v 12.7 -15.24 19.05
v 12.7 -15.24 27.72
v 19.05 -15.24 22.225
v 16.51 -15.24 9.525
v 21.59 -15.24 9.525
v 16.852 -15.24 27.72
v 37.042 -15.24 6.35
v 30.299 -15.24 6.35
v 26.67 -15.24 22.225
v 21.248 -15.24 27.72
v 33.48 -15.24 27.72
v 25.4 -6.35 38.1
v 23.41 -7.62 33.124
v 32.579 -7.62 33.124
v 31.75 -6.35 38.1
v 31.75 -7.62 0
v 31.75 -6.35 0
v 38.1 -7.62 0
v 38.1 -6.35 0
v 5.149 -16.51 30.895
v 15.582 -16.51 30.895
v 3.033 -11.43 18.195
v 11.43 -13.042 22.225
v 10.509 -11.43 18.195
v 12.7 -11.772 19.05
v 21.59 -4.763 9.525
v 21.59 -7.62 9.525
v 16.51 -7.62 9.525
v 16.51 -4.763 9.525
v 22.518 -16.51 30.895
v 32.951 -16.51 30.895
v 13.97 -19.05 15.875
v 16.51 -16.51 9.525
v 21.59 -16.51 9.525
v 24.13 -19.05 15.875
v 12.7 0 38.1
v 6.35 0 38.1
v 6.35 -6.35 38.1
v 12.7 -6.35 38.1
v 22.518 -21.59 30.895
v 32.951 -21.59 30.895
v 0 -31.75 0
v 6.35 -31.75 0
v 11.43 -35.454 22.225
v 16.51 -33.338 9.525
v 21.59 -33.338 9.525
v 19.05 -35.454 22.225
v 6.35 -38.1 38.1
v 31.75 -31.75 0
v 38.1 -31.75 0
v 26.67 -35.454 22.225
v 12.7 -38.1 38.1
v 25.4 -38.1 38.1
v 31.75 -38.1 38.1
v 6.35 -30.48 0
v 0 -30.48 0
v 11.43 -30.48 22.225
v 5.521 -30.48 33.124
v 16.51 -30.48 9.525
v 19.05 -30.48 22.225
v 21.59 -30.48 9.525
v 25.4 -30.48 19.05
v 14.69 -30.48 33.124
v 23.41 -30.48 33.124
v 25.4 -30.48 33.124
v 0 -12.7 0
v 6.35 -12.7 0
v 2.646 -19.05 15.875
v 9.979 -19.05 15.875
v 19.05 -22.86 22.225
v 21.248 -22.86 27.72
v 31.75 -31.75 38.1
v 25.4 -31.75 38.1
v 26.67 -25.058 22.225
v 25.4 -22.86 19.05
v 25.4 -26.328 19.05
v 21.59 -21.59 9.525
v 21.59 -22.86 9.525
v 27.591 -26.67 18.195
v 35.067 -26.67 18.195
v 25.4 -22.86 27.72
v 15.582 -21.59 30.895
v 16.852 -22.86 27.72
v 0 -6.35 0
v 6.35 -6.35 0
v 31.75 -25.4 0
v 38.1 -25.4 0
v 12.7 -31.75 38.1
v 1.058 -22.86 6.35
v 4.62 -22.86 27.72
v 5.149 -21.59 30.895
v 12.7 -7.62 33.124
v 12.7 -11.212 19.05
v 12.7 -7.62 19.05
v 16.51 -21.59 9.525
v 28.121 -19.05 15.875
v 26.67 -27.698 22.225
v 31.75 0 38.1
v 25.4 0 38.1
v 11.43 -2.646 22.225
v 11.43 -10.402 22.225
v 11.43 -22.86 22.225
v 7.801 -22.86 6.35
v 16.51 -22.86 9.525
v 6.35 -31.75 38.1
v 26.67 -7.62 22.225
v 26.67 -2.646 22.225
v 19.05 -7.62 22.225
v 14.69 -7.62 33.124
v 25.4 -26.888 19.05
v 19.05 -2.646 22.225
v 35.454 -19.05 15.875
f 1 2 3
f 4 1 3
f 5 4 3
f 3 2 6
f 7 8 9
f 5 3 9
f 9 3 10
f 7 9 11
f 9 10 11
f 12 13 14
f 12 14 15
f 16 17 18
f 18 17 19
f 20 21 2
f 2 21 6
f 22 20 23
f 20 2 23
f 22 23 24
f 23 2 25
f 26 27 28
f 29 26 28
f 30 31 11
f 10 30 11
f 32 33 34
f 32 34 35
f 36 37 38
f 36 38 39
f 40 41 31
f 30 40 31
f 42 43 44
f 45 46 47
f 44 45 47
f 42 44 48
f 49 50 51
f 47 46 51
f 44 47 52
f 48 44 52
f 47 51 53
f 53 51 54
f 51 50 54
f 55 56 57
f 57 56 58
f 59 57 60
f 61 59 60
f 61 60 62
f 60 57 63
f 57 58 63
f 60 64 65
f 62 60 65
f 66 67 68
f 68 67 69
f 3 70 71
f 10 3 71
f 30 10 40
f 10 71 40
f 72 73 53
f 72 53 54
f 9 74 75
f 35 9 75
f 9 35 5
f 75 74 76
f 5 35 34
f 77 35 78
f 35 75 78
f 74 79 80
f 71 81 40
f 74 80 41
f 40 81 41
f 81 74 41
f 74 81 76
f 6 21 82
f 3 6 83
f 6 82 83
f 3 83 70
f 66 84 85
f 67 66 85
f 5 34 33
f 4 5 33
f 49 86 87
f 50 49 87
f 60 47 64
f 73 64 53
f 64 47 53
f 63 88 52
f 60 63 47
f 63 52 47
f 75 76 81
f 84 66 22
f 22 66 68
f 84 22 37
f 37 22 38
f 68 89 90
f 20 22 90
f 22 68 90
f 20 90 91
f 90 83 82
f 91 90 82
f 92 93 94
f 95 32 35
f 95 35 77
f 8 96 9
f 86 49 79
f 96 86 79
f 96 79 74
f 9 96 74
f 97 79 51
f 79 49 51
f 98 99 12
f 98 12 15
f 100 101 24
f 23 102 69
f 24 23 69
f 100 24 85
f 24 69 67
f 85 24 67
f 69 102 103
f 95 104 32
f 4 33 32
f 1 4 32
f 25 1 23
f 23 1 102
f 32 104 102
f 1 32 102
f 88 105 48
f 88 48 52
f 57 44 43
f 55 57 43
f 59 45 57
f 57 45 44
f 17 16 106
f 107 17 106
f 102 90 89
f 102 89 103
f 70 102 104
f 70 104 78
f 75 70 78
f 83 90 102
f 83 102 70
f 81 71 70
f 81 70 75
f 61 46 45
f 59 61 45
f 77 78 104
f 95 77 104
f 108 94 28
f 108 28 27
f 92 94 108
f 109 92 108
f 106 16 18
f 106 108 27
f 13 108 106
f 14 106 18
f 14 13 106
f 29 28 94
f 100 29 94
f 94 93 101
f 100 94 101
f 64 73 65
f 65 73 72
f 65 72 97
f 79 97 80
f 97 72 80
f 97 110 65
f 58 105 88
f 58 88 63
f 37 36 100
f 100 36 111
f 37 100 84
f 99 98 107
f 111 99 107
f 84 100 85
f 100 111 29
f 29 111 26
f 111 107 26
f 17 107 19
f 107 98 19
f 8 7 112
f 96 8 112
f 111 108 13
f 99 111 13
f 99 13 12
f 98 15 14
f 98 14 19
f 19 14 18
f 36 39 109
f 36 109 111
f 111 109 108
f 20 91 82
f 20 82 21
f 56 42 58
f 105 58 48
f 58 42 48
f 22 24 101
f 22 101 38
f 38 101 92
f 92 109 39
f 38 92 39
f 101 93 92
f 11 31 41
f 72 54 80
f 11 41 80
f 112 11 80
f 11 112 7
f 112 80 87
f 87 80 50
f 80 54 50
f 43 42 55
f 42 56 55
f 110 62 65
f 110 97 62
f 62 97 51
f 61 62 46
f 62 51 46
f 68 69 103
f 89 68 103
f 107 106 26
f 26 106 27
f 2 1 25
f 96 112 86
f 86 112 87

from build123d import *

# Parameters (mm, degrees)
F0_W      = 38.1
F0_H      = 38.099996
F1_DEPTH  = 38.1
F6_DEPTH  = 38.1
F8_DEPTH  = 38.1
F9_W      = 25.4
F9_H      = 7.62
F10_DEPTH = 38.1


with BuildPart() as f1:
    # F0 (on Front) → F1 (new body)
    with BuildSketch(Plane.XZ):
        with Locations((19.05, 19.049998)):
            Rectangle(F0_W, F0_H)
    extrude(amount=F1_DEPTH)

    # F5 (on offset) → F6 (cut)
    with BuildSketch(Plane.YZ.offset(38.1)):
        Polygon((-31.75, 0), (-38.1, 38.1), (-38.1, 0), align=None)
        Polygon((-11.43, 18.195421), (-6.35, 38.1), (-31.75, 38.1), (-26.67, 18.195421), (-21.59, 30.895421), (-16.51, 30.895421), align=None)
        Polygon((-25.4, 0), (-12.7, 0), (-19.05, 15.875), align=None)
        Polygon((-6.35, 0), (0, 0), (0, 38.1), align=None)
    extrude(amount=-F6_DEPTH, mode=Mode.SUBTRACT)

    # F7 (on offset) → F8 (cut)
    with BuildSketch(Plane.XZ.offset(38.1)):
        Polygon((0, 38.1), (0, 0), (6.35, 38.1), align=None)
        Polygon((25.4, 38.1), (12.7, 38.1), (19.05, 22.225), align=None)
        Polygon((31.75, 38.1), (38.1, 0), (38.1, 38.1), align=None)
        Polygon((11.43, 22.225), (6.35, 0), (31.75, 0), (26.67, 22.225), (21.59, 9.525), (16.51, 9.525), align=None)
    extrude(amount=-F8_DEPTH, mode=Mode.SUBTRACT)

    # F9 (on offset) → F10 (cut)
    with BuildSketch(Plane.XY.offset(38.1)):
        with Locations((12.7, -26.67)):
            Rectangle(F9_W, F9_H)
        with Locations((25.4, -11.43)):
            Rectangle(F9_W, F9_H)
    extrude(amount=-F10_DEPTH, mode=Mode.SUBTRACT)


solid = f1.part
